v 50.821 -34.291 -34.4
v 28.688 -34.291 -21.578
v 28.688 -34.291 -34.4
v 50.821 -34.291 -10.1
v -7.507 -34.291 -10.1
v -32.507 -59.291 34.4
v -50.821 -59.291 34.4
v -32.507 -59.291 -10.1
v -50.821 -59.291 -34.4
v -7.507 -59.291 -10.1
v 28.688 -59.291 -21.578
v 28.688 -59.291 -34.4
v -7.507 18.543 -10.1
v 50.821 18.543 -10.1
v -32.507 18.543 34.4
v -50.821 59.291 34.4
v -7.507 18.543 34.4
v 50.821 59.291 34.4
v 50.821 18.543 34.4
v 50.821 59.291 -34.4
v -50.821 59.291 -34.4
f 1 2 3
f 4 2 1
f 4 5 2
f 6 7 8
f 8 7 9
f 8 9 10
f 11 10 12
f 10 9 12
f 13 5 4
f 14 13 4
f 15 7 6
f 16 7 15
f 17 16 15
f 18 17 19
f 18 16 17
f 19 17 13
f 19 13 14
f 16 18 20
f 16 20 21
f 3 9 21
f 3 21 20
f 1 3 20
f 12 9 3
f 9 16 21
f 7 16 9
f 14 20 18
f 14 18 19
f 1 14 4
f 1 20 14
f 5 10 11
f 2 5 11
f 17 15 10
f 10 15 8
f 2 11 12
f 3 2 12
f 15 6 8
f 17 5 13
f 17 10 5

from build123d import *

# Parameters (mm, degrees)
F1_DEPTH = 34.4
F2_W     = 83.3284929395
F2_H     = 77.8343044221
F3_DEPTH = 24.3
F5_DEPTH = 25
F7_DEPTH = 25


with BuildPart() as f1:
    # F0 (on Top) → F1 (new body, symmetric)
    with BuildSketch(Plane.XY):
        Polygon((50.8212260902, 18.5428783298), (50.8212260902, 59.2914260924), (-50.8212260902, 59.2914260924), (-50.8212260902, -59.2914260924), (-32.5072668493, -59.2914260924), (-32.5072668493, 18.5428783298), align=None)
    extrude(amount=F1_DEPTH, both=True)

    # F2 (on face) → F3 (join)
    with BuildSketch(Plane(origin=(0, 0, -34.4), x_dir=(1, 0, 0), z_dir=(0, 0, -1))):
        with Locations((9.1569796205, 20.3742738813)):
            Rectangle(F2_W, F2_H)
    extrude(amount=-F3_DEPTH)

    # F4 (on face) → F5 (join)
    with BuildSketch(Plane.YZ.offset(-32.5072668493)):
        Polygon((18.5428783298, 34.4), (-59.2914260924, -10.1), (18.5428783298, -10.1), align=None)
    extrude(amount=F5_DEPTH)

    # F6 (on face) → F7 (cut)
    with BuildSketch(Plane.XZ.offset(59.2914260924)):
        Polygon((50.8212260902, -10.1), (-7.5072668493, -10.1), (28.6875050515, -21.577918902), (28.6875050515, -34.4), (50.8212260902, -34.4), align=None)
    extrude(amount=-F7_DEPTH, mode=Mode.SUBTRACT)


solid = f1.part
